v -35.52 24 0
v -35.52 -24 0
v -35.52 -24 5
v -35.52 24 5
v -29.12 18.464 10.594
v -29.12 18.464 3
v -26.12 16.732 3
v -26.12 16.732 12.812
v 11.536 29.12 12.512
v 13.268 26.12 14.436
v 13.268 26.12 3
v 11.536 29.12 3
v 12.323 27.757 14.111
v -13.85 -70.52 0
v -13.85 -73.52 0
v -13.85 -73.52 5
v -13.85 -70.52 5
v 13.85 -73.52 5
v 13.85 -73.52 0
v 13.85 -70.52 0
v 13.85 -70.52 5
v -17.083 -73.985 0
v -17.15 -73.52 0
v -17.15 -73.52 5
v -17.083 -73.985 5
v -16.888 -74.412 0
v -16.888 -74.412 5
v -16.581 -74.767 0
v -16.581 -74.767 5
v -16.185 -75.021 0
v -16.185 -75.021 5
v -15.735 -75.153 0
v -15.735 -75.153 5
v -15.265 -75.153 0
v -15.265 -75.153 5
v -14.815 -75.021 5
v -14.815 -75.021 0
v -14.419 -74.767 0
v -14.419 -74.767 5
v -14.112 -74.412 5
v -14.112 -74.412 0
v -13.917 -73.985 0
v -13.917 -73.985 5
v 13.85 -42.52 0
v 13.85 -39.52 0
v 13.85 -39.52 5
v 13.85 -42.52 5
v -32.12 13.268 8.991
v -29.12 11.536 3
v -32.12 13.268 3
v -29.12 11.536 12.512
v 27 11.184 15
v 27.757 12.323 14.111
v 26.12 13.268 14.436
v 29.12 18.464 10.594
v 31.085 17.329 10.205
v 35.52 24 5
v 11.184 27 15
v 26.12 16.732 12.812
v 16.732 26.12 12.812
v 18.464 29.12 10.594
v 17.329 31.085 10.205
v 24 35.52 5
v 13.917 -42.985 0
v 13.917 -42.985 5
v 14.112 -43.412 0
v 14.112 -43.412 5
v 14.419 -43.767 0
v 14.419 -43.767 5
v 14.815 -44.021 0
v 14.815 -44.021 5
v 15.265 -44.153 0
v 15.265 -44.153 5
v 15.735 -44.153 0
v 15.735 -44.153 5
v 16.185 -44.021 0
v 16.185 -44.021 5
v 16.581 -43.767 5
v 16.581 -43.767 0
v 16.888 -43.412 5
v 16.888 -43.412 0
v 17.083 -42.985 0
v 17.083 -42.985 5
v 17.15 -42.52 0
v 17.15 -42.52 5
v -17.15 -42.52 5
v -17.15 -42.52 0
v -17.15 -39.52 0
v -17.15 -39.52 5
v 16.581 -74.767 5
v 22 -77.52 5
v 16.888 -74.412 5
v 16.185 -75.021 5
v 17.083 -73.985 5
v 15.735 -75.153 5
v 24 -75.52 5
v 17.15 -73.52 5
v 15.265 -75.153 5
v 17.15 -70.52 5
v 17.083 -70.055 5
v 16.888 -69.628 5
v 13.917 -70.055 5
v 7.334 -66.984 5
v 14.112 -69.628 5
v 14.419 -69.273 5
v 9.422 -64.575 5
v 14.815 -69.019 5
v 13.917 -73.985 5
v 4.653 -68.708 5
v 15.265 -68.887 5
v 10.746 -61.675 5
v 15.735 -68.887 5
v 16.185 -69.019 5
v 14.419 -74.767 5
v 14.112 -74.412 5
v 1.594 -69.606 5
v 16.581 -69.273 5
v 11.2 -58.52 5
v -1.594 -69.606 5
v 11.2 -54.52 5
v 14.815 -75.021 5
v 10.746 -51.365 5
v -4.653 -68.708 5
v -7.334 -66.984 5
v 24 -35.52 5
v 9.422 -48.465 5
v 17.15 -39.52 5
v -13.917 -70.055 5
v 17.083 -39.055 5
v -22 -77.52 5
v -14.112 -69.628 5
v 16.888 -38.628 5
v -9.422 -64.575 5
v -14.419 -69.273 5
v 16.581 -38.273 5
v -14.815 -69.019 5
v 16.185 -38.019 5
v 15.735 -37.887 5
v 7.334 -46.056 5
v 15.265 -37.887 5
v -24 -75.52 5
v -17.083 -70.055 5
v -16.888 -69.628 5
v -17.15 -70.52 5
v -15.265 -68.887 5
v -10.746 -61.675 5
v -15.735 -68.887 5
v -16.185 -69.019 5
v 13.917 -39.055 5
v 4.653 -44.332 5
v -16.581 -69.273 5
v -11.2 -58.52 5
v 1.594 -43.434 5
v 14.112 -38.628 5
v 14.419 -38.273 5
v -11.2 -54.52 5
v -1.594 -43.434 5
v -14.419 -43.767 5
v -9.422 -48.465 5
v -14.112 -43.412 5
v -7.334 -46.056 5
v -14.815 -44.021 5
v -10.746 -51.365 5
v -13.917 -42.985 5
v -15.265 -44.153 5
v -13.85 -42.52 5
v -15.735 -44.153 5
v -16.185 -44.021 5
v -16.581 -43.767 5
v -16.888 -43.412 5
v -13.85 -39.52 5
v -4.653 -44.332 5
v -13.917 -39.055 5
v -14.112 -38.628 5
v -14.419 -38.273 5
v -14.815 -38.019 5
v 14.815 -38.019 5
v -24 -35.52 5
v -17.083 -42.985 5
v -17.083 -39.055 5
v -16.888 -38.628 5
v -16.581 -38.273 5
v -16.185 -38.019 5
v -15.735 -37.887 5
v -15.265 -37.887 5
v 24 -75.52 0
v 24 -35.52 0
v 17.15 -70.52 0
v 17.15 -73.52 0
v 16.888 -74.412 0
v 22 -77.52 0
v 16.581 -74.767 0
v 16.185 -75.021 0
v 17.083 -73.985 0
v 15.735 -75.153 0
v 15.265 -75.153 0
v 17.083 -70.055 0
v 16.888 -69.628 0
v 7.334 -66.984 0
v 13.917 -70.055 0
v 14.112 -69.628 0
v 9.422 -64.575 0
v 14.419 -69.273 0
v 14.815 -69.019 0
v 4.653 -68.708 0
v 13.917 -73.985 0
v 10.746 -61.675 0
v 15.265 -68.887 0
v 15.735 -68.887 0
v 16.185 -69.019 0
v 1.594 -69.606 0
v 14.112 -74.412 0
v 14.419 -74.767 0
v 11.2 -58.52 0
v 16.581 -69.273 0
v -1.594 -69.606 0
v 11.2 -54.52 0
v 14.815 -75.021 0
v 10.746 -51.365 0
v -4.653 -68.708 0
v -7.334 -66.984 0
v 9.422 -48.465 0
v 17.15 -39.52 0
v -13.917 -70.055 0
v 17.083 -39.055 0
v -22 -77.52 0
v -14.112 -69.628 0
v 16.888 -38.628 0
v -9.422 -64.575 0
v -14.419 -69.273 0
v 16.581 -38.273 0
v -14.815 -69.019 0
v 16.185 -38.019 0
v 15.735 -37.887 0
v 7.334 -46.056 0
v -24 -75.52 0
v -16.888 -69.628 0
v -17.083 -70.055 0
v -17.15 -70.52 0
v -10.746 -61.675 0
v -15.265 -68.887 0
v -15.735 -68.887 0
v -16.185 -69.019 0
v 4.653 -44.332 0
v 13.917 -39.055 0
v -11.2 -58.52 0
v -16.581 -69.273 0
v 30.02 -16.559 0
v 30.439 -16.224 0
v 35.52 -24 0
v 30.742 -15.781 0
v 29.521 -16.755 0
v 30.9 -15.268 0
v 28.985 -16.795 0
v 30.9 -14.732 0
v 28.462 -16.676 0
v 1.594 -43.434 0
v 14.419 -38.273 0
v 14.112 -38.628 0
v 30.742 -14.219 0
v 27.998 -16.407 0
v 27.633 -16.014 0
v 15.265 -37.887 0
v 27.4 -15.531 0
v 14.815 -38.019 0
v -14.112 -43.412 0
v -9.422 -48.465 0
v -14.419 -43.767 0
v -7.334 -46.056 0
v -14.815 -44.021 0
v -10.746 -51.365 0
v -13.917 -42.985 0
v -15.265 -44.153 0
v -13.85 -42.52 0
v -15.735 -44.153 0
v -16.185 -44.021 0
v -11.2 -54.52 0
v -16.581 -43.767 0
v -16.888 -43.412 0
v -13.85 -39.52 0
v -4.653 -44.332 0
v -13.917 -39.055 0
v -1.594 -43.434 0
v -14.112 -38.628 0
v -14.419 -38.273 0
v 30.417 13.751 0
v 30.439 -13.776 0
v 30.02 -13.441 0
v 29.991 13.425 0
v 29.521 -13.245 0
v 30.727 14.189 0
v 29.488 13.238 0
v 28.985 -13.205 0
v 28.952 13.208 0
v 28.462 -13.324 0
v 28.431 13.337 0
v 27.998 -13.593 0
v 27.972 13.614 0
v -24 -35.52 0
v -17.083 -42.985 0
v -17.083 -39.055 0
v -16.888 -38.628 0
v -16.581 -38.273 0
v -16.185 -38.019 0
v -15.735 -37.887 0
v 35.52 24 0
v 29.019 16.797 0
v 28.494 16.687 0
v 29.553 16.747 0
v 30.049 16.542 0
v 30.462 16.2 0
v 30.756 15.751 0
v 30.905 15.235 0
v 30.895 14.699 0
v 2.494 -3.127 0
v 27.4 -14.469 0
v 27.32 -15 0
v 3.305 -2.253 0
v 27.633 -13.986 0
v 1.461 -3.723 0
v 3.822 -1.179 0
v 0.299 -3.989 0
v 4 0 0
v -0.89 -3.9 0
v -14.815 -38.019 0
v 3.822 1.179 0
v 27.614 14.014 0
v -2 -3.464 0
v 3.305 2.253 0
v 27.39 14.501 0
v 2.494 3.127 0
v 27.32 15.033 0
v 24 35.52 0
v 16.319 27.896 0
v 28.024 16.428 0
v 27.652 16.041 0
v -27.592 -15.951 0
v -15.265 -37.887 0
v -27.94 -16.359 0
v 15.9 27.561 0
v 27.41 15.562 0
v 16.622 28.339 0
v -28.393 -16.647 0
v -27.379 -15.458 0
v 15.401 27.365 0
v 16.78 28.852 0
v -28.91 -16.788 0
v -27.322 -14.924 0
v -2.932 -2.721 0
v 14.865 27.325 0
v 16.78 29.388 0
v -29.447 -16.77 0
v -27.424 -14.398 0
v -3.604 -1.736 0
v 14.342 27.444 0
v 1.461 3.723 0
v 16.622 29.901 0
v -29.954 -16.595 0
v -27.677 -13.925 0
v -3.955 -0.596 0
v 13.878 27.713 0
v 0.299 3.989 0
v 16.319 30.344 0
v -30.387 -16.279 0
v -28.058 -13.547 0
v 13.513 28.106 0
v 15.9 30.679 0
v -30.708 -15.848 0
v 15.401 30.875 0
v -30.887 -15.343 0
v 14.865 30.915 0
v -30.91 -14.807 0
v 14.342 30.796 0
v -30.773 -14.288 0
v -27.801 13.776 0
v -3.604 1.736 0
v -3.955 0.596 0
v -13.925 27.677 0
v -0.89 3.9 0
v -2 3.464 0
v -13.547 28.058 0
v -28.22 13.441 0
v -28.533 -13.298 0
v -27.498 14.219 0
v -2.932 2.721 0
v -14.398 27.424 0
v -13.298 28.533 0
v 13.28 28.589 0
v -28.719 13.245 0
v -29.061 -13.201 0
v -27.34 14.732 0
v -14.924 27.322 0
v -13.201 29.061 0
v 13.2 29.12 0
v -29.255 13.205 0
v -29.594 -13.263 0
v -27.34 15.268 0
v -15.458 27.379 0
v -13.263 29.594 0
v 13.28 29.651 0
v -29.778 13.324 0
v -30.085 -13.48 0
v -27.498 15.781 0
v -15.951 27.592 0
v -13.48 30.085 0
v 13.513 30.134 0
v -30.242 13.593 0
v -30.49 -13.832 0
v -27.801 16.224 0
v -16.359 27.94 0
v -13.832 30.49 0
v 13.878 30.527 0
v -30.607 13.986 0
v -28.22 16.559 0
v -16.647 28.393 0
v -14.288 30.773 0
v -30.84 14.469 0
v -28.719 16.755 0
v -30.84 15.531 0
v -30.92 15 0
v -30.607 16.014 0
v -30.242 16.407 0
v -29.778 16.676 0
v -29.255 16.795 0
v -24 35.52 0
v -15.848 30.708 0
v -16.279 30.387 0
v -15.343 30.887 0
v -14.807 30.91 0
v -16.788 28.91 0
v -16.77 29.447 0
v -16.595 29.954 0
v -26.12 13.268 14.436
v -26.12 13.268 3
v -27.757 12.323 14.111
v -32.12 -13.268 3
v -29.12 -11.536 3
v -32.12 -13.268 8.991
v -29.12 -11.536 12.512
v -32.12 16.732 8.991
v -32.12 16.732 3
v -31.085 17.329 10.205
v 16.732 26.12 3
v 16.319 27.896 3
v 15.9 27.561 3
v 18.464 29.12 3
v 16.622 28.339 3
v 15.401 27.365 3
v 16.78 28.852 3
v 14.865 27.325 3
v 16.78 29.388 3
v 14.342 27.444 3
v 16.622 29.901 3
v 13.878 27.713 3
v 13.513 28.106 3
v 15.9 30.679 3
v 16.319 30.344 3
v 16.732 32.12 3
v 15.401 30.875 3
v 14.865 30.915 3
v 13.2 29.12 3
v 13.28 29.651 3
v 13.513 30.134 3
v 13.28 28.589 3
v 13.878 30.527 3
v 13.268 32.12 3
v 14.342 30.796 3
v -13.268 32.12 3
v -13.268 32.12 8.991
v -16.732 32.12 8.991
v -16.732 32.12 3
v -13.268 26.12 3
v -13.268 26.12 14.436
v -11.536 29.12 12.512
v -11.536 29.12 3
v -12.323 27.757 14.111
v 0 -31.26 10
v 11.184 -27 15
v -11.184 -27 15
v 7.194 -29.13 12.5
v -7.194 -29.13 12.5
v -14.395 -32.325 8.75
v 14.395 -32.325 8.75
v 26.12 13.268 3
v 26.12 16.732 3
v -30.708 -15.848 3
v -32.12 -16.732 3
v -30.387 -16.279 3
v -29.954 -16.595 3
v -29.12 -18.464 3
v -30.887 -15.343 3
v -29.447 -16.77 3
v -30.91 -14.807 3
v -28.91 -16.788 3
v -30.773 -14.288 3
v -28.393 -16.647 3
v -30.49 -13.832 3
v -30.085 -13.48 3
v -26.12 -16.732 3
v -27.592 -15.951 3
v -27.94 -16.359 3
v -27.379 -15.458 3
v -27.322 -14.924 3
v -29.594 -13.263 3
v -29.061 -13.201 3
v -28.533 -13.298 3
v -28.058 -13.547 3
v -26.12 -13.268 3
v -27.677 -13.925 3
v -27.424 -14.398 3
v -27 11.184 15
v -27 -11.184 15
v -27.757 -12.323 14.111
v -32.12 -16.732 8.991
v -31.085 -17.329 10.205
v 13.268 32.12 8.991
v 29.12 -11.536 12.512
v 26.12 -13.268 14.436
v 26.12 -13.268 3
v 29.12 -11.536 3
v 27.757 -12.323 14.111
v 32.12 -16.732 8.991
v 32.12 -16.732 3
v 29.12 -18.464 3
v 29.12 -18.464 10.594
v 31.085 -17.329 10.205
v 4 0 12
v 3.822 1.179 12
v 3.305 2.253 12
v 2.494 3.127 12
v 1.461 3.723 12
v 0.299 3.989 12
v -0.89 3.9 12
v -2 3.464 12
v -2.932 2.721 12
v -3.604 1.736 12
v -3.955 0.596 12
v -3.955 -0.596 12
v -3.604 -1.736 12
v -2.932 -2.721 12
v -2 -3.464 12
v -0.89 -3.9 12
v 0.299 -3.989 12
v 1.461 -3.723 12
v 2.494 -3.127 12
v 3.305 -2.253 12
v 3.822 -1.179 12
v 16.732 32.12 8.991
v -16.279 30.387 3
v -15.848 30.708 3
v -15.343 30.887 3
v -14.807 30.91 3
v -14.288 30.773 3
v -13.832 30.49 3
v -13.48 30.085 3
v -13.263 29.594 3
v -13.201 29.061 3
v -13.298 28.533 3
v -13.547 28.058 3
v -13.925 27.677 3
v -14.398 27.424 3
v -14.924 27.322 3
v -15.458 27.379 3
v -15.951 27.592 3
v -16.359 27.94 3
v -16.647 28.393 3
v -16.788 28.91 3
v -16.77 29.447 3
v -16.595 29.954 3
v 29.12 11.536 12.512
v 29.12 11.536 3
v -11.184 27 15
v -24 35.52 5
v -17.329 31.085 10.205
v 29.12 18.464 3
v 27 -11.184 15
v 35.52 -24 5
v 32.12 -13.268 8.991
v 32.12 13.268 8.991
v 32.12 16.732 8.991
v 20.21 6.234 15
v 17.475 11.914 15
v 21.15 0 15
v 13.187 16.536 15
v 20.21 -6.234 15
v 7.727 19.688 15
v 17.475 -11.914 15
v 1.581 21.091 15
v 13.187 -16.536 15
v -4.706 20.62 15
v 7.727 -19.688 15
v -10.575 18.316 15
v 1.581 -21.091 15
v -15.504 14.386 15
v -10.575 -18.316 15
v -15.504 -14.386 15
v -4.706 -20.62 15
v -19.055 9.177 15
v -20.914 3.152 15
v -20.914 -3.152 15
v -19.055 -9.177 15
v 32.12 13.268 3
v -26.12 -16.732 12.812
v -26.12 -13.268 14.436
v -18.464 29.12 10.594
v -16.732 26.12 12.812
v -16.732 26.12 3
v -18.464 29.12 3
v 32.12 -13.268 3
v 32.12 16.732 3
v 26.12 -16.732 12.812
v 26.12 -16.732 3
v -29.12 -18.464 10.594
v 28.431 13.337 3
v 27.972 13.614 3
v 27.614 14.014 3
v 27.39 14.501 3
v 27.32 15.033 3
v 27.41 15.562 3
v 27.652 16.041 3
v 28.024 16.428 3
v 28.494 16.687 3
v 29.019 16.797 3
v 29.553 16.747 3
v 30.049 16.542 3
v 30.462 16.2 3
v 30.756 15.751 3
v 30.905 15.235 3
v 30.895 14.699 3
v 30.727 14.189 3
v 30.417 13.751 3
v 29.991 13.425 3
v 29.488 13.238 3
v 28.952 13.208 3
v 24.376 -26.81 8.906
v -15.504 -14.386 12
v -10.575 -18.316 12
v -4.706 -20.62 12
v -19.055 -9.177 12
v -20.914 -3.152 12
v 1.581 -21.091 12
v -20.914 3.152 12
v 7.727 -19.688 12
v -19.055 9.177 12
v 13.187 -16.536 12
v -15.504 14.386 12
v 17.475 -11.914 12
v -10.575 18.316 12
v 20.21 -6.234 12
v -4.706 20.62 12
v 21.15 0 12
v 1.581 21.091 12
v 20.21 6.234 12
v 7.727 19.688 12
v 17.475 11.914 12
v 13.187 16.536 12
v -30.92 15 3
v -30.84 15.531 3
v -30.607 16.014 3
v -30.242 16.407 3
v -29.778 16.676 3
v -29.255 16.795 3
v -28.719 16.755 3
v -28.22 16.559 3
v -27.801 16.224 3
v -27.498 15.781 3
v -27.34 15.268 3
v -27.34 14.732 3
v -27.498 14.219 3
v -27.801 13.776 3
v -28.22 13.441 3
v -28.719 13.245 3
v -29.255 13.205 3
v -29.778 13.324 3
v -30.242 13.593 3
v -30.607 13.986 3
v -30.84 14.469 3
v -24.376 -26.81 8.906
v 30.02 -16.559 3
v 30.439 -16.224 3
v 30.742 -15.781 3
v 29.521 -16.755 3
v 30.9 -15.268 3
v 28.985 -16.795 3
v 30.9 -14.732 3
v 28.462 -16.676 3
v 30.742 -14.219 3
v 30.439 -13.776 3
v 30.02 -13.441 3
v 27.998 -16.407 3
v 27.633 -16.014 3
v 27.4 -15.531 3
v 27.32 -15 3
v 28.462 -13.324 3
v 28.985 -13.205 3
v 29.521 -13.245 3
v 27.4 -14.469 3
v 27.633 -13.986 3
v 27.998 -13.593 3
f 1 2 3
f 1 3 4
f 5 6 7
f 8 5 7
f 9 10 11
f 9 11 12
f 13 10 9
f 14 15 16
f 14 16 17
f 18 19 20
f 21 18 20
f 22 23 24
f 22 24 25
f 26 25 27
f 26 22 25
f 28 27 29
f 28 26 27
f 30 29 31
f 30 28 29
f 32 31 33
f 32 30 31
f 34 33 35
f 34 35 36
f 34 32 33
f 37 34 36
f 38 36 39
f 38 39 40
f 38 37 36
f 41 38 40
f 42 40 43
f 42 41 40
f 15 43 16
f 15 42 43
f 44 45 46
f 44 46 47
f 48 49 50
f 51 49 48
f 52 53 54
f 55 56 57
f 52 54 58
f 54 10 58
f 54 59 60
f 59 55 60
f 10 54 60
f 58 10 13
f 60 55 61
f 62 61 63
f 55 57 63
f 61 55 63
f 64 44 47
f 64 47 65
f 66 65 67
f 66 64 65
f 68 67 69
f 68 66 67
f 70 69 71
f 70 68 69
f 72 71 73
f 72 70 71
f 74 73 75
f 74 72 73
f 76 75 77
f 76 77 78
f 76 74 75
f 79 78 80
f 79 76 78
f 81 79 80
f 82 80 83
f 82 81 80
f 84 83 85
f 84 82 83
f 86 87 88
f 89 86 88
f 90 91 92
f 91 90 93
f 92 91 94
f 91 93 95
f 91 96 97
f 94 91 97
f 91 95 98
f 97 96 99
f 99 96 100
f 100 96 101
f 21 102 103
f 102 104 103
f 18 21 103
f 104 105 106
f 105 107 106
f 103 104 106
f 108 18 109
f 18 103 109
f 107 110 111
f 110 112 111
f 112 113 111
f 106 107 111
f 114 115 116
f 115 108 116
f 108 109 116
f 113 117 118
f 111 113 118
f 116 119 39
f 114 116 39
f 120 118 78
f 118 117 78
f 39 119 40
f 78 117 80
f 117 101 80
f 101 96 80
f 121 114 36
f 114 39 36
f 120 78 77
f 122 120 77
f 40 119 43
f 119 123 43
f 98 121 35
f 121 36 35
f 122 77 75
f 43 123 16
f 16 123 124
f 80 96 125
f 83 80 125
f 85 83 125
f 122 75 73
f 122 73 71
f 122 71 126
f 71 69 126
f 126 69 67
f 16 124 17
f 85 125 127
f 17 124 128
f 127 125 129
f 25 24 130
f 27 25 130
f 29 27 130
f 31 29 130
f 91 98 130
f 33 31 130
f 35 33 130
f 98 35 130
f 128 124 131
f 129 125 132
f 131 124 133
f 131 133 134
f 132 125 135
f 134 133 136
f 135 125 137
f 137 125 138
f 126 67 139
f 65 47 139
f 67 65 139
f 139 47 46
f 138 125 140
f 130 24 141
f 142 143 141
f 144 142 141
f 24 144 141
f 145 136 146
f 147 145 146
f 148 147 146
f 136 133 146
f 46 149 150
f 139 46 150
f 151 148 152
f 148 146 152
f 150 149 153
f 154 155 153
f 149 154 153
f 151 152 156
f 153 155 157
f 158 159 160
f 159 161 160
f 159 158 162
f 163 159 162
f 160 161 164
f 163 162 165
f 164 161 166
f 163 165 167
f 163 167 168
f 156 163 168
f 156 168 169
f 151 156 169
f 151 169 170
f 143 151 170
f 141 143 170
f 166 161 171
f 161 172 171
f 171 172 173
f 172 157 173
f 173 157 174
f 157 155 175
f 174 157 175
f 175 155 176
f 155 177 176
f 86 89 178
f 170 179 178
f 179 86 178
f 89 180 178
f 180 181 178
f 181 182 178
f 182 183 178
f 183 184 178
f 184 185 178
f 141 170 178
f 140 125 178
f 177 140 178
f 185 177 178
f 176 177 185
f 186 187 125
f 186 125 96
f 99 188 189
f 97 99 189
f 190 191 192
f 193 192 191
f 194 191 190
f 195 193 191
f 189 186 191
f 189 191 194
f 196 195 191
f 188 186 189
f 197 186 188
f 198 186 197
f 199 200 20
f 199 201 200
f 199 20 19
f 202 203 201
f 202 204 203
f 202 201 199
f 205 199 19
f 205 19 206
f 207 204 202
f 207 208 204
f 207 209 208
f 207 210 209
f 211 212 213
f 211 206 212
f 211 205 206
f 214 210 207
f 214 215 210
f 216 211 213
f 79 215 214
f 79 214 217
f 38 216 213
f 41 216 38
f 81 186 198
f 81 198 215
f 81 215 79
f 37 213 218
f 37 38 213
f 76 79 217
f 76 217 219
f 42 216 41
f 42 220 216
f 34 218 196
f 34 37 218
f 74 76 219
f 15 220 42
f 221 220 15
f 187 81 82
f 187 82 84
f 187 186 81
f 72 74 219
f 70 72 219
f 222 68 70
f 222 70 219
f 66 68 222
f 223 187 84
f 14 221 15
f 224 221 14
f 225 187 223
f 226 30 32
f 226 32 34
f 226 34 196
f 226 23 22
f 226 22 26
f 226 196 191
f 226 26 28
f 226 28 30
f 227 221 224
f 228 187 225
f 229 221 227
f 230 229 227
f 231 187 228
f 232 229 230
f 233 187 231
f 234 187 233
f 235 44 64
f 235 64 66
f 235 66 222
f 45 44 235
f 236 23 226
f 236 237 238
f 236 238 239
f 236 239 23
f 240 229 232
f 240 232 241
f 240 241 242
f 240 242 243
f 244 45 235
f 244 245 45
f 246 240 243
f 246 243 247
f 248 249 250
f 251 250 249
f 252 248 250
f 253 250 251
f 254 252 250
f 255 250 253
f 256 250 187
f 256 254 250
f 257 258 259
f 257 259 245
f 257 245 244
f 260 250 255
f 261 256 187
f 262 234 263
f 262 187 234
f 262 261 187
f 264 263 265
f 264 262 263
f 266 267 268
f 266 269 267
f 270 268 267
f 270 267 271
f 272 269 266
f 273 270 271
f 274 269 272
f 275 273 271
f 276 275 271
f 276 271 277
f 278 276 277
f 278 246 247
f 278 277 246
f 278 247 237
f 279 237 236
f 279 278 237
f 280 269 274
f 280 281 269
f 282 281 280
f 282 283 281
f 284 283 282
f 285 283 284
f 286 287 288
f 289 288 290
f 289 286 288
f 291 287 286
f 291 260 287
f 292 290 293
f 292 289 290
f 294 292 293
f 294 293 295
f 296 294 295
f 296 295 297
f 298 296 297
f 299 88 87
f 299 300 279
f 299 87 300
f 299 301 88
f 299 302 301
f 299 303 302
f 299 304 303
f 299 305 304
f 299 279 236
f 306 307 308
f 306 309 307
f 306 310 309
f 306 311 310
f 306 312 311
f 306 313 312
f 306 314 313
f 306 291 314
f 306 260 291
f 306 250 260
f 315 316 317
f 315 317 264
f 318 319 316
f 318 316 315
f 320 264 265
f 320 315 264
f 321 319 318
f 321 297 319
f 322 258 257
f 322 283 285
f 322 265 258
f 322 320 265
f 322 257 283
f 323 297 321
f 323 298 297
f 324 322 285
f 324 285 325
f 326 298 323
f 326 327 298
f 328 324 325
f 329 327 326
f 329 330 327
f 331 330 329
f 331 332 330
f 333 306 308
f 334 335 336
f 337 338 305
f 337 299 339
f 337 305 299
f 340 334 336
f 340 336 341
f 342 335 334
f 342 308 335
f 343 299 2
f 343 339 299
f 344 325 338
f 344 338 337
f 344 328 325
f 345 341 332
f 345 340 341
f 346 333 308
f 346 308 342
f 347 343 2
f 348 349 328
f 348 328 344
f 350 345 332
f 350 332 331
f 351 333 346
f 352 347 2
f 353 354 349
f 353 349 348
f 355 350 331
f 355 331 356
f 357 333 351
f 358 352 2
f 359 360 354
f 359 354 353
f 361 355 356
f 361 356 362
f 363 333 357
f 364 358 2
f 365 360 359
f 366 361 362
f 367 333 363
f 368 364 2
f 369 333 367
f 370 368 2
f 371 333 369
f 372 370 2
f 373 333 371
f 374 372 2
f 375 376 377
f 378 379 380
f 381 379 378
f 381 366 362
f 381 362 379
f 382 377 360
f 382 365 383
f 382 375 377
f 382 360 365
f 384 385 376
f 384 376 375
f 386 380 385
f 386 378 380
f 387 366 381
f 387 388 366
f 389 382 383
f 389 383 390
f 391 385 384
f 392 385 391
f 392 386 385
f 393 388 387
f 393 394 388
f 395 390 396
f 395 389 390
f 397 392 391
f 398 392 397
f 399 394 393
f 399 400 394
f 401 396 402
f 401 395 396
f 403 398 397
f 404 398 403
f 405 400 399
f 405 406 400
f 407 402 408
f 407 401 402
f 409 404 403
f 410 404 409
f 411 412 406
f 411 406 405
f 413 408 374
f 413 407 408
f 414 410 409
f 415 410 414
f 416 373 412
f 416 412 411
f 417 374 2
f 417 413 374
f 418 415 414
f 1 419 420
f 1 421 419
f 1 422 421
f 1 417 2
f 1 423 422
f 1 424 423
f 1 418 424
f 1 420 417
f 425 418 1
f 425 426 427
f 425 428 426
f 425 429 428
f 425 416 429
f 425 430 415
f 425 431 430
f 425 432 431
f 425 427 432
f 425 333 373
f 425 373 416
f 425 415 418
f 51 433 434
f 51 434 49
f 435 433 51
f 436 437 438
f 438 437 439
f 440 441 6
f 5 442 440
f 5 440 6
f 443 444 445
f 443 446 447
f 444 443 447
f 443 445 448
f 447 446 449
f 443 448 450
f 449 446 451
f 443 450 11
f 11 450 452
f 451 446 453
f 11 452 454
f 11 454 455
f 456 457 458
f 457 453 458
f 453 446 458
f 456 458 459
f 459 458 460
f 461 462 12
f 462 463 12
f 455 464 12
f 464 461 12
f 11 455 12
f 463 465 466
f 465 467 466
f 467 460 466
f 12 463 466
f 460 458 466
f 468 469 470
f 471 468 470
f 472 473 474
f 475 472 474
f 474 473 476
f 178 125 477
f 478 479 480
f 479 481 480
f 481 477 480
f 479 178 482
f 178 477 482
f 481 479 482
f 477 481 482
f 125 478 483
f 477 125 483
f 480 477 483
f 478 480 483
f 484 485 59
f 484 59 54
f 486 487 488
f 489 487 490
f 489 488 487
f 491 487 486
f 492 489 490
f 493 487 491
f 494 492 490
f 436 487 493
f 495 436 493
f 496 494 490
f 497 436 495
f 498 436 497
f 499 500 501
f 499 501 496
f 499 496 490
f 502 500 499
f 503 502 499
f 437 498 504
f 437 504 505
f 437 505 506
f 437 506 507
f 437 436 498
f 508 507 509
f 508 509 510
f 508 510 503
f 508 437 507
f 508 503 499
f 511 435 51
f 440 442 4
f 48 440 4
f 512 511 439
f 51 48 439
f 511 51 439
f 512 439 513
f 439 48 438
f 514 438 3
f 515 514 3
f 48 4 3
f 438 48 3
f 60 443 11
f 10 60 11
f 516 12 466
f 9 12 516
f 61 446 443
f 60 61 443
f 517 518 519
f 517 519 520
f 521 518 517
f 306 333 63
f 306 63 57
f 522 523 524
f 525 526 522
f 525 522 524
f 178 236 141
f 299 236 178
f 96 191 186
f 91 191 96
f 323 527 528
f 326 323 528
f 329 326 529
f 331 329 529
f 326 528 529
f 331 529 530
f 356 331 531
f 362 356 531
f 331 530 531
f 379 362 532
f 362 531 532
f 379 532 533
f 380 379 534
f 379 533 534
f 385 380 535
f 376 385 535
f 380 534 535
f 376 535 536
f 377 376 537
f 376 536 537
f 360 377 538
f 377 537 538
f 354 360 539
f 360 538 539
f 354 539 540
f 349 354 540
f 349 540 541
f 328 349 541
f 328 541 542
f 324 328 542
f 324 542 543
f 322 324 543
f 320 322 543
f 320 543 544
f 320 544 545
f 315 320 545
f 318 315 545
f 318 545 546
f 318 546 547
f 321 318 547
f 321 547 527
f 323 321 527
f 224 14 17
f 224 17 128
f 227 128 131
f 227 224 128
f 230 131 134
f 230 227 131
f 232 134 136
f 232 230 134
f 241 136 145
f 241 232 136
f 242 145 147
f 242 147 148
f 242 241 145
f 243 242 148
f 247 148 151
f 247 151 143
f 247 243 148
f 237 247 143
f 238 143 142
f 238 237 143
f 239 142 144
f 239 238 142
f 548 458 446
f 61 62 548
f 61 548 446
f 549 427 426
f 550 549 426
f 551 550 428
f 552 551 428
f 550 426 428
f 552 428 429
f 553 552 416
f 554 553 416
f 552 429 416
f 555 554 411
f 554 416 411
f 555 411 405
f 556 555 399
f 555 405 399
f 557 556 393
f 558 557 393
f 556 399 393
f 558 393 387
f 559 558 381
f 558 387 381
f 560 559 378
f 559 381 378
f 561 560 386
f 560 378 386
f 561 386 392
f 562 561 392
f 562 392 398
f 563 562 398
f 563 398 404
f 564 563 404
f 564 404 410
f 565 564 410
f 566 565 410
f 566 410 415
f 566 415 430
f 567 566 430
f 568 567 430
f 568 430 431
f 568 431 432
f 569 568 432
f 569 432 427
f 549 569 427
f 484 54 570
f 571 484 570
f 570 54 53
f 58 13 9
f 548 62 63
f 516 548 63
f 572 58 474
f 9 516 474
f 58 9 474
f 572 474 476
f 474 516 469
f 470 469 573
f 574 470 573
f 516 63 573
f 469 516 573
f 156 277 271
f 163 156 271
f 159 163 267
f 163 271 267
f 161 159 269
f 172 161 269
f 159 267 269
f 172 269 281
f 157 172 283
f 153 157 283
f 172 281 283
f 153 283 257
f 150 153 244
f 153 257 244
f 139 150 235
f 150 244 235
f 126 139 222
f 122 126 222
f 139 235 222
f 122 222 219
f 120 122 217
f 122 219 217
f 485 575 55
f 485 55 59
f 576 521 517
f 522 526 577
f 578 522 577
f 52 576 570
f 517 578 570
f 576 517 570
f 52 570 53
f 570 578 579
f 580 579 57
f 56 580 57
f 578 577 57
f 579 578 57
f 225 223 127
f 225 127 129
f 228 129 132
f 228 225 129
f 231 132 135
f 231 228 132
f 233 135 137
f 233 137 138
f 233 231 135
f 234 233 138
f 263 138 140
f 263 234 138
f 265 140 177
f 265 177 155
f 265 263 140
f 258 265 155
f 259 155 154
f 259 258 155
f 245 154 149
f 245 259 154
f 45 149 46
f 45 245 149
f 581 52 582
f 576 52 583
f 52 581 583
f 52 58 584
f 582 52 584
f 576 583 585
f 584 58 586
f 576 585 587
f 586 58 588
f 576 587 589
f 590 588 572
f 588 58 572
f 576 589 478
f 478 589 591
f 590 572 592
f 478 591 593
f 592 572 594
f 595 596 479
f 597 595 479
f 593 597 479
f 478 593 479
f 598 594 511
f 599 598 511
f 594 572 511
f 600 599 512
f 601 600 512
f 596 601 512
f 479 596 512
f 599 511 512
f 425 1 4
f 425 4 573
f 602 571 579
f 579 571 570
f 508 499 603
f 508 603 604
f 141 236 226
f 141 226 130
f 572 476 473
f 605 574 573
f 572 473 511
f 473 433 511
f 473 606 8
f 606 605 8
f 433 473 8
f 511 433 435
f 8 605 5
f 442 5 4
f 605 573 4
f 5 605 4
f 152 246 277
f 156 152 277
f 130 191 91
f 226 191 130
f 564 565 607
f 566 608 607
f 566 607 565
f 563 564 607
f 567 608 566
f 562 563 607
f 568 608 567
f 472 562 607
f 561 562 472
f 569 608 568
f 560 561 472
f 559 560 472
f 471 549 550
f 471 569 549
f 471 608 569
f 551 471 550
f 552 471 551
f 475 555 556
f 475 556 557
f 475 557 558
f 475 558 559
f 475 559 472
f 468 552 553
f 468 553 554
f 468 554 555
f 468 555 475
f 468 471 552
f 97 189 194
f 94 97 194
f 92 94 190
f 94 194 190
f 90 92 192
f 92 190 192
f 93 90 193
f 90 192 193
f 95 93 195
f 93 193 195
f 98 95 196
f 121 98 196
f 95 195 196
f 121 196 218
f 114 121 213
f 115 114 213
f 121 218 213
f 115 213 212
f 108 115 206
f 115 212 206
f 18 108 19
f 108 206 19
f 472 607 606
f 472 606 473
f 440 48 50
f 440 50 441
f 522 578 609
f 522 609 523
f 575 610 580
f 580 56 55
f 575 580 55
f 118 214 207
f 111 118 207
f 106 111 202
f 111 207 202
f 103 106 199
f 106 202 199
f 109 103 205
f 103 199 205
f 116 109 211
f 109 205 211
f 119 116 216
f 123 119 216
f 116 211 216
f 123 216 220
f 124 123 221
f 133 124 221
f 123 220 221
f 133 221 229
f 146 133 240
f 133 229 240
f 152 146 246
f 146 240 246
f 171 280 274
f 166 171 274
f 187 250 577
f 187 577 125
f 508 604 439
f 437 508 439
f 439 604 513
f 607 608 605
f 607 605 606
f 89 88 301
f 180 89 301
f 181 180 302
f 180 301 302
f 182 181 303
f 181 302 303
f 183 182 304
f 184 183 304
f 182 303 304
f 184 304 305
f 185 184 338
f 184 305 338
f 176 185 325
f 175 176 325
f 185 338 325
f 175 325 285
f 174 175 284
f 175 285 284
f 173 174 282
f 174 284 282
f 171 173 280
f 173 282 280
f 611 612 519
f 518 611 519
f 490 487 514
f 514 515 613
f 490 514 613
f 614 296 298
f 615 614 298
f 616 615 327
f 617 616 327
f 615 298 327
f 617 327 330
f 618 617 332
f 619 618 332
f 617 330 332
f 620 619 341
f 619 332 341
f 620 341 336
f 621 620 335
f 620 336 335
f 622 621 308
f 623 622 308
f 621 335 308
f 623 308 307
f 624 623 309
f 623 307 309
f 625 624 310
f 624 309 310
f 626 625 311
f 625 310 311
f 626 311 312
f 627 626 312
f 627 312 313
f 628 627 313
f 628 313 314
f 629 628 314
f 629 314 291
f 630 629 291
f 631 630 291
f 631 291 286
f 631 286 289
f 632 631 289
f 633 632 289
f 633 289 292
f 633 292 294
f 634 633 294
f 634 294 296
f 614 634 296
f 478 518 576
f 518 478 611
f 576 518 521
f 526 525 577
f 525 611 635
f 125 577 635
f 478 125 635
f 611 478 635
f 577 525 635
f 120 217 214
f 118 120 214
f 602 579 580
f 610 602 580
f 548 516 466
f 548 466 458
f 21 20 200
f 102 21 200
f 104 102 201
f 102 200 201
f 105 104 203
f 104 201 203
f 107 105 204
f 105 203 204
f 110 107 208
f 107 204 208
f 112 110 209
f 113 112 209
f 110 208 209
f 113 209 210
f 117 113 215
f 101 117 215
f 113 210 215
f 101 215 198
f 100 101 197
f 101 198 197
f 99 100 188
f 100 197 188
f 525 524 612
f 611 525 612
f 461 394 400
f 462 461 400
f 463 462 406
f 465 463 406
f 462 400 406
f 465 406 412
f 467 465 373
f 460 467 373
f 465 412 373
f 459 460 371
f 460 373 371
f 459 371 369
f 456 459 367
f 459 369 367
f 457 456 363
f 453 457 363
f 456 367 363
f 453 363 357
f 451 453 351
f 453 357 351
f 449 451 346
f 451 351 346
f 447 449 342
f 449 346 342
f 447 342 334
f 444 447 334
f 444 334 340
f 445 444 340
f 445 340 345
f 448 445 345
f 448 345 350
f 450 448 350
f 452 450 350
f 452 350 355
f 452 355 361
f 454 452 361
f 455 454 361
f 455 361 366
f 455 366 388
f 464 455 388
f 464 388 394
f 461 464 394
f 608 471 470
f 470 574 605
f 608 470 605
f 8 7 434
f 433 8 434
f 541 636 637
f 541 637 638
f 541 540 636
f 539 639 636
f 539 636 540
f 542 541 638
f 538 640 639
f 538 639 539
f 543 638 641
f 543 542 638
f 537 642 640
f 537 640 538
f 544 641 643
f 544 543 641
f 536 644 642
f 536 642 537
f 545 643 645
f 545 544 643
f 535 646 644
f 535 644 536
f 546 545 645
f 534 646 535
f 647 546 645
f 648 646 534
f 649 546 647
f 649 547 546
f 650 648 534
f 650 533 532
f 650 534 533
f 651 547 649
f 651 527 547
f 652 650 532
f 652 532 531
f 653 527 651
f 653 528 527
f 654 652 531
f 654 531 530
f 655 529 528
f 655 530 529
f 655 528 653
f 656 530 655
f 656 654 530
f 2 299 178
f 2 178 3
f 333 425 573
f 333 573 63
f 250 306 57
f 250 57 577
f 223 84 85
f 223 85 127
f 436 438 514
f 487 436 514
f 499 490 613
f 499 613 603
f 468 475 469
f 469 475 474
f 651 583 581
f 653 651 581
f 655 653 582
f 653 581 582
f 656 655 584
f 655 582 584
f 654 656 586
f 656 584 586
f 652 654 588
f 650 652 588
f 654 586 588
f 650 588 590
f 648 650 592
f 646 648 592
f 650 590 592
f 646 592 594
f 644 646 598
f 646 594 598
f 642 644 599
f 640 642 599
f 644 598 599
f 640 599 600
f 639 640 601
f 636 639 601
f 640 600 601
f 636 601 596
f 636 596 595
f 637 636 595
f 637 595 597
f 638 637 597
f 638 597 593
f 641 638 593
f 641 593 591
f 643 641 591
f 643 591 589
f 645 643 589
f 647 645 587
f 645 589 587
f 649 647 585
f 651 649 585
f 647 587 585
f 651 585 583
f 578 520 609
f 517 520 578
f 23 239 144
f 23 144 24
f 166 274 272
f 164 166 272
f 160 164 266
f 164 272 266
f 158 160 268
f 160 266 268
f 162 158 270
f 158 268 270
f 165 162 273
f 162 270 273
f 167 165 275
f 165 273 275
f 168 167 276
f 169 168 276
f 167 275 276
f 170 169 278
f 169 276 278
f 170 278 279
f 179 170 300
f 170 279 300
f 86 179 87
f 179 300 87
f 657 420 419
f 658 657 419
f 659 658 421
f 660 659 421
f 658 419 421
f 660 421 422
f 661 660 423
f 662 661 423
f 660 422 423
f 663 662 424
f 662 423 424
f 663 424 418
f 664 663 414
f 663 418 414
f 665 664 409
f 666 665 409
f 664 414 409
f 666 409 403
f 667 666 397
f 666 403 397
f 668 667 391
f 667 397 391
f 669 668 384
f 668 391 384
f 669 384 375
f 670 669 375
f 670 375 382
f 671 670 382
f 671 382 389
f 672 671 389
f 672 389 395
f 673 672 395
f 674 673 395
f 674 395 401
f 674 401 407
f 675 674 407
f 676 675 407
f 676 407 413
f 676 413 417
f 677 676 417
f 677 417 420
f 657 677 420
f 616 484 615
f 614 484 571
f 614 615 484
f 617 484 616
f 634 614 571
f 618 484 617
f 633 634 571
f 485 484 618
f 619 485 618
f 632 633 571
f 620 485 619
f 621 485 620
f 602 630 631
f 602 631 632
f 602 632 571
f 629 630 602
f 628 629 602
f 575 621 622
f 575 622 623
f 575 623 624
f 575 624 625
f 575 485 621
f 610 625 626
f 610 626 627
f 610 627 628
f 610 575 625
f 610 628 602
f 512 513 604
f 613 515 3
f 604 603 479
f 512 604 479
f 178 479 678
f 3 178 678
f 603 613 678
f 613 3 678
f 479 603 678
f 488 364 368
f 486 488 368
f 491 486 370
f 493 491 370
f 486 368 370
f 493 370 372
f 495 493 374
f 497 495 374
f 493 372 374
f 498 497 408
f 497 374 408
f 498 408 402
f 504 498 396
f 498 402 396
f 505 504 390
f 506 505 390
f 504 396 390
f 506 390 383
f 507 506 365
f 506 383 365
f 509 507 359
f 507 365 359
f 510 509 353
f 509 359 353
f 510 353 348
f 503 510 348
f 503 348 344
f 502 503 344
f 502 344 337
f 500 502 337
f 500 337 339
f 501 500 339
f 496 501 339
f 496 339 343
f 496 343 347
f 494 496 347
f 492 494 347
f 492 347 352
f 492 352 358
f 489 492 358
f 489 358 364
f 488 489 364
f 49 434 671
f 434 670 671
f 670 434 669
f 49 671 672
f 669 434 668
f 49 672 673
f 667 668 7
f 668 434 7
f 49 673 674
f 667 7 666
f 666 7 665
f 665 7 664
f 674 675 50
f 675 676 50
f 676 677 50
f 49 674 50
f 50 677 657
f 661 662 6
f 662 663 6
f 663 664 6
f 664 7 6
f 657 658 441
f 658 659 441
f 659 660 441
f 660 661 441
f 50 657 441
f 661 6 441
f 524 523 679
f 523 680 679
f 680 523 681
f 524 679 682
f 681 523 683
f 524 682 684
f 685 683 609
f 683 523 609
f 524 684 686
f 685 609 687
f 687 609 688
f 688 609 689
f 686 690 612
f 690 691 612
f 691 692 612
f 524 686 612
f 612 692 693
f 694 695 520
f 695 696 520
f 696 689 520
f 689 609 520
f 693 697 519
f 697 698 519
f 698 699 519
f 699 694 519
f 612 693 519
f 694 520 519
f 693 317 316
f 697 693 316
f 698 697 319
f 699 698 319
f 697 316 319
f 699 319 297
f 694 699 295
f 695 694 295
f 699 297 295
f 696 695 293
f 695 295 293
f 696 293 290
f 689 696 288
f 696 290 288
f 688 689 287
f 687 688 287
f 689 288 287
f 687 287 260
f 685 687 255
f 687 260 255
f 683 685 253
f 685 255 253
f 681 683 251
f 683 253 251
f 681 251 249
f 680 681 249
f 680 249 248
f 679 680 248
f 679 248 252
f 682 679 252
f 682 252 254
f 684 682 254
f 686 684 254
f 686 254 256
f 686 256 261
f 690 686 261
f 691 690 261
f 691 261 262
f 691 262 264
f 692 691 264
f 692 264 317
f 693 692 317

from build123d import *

# Parameters (mm, degrees)
EXTRUDE_1_DEPTH     = 5
SKETCH_5_R          = 21.15
CUT_EXTRUDE_1_DEPTH = 3
SKETCH_6_R          = 4
CUT_EXTRUDE_2_DEPTH = 37
SKETCH_7_R          = 1.8
CUT_EXTRUDE_3_DEPTH = 37
CUT_EXTRUDE_4_DEPTH = 12
CHAMFER_1_SIZE      = 2


with BuildPart() as part:
    # 草图1 → 凸台-拉伸1 (new body)
    with BuildSketch(Plane.XY):
        Polygon((24, 35.52), (35.52, 24), (35.52, -24), (24, -35.52), (24, -77.52), (-24, -77.52), (-24, -35.52), (-35.52, -24), (-35.52, 24), (-24, 35.52), align=None)
        with BuildLine():
            Line((11.2, -54.52), (11.2, -58.52))
            ThreePointArc((11.2, -58.52), (0, -69.72), (-11.2, -58.52))
            Line((-11.2, -58.52), (-11.2, -54.52))
            ThreePointArc((-11.2, -54.52), (0, -43.32), (11.2, -54.52))
        make_face(mode=Mode.SUBTRACT)
        with BuildLine():
            Line((-17.15, -42.52), (-17.15, -39.52))
            ThreePointArc((-17.15, -39.52), (-15.5, -37.87), (-13.85, -39.52))
            Line((-13.85, -39.52), (-13.85, -42.52))
            ThreePointArc((-13.85, -42.52), (-15.5, -44.17), (-17.15, -42.52))
        make_face(mode=Mode.SUBTRACT)
        with BuildLine():
            Line((17.15, -42.52), (17.15, -39.52))
            ThreePointArc((17.15, -39.52), (15.5, -37.87), (13.85, -39.52))
            Line((13.85, -39.52), (13.85, -42.52))
            ThreePointArc((13.85, -42.52), (15.5, -44.17), (17.15, -42.52))
        make_face(mode=Mode.SUBTRACT)
        with BuildLine():
            Line((17.15, -70.52), (17.15, -73.52))
            ThreePointArc((17.15, -73.52), (15.5, -75.17), (13.85, -73.52))
            Line((13.85, -73.52), (13.85, -70.52))
            ThreePointArc((13.85, -70.52), (15.5, -68.87), (17.15, -70.52))
        make_face(mode=Mode.SUBTRACT)
        with BuildLine():
            Line((-17.15, -70.52), (-17.15, -73.52))
            ThreePointArc((-17.15, -73.52), (-15.5, -75.17), (-13.85, -73.52))
            Line((-13.85, -73.52), (-13.85, -70.52))
            ThreePointArc((-13.85, -70.52), (-15.5, -68.87), (-17.15, -70.52))
        make_face(mode=Mode.SUBTRACT)
    extrude(amount=EXTRUDE_1_DEPTH)

    # 草图3 → 放样1 section 0
    with BuildSketch(Plane.XY.offset(15)):
        with BuildLine():
            Line((11.183766184, 27), (-11.183766184, 27))
            Line((-11.183766184, 27), (-27, 11.183766184))
            Line((-27, 11.183766184), (-27, -11.183766184))
            Line((-27, -11.183766184), (-11.183766184, -27))
            Line((-11.183766184, -27), (11.183766184, -27))
            Line((11.183766184, -27), (27, -11.183766184))
            Line((27, -11.183766184), (27, 11.183766184))
            Line((27, 11.183766184), (11.183766184, 27))
        make_face()
    # 草图4 → 放样1 section 1
    with BuildSketch(Plane.XY.offset(5)):
        with BuildLine():
            Line((-24, -35.52), (24, -35.52))
            Line((24, -35.52), (35.52, -24))
            Line((35.52, -24), (35.52, 24))
            Line((35.52, 24), (24, 35.52))
            Line((24, 35.52), (-24, 35.52))
            Line((-24, 35.52), (-35.52, 24))
            Line((-35.52, 24), (-35.52, -24))
            Line((-35.52, -24), (-24, -35.52))
        make_face()
    loft()

    # 草图5 → 切除-拉伸1 (cut)
    with BuildSketch(Plane.XY.offset(15)):
        Circle(SKETCH_5_R)
    extrude(amount=-CUT_EXTRUDE_1_DEPTH, mode=Mode.SUBTRACT)

    # 草图6 → 切除-拉伸2 (cut)
    with BuildSketch(Plane.XY.offset(12)):
        Circle(SKETCH_6_R)
    extrude(amount=-CUT_EXTRUDE_2_DEPTH, mode=Mode.SUBTRACT)

    # 草图7 → 切除-拉伸3 (cut)
    with BuildSketch(Plane(origin=(0, 0, 0), x_dir=(-1, 0, 0), z_dir=(0, 0, -1))):
        with Locations((29.12, 15)):
            Circle(SKETCH_7_R)
        with Locations(Location((29.12, -15, 0), (0, 0, 314.737833249))):
            Circle(SKETCH_7_R)
        with Locations((-29.12, -15)):
            Circle(SKETCH_7_R)
        with Locations(Location((-29.12, 15, 0), (0, 0, 292.492646576))):
            Circle(SKETCH_7_R)
        with Locations((-15, 29.12)):
            Circle(SKETCH_7_R)
        with Locations(Location((15, 29.12, 0), (0, 0, 44.737833249))):
            Circle(SKETCH_7_R)
    extrude(amount=-CUT_EXTRUDE_3_DEPTH, mode=Mode.SUBTRACT)

    # 草图8 → 切除-拉伸4 (cut)
    with BuildSketch(Plane.XY.offset(15)):
        Polygon((-29.12, -11.535898385), (-32.12, -13.267949192), (-32.12, -16.732050808), (-29.12, -18.464101615), (-26.12, -16.732050808), (-26.12, -13.267949192), align=None)
        Polygon((-26.12, 13.267949192), (-29.12, 11.535898385), (-32.12, 13.267949192), (-32.12, 16.732050808), (-29.12, 18.464101615), (-26.12, 16.732050808), align=None)
        Polygon((13.267949192, 26.12), (11.535898385, 29.12), (13.267949192, 32.12), (16.732050808, 32.12), (18.464101615, 29.12), (16.732050808, 26.12), align=None)
        Polygon((-11.535898385, 29.12), (-13.267949192, 32.12), (-16.732050808, 32.12), (-18.464101615, 29.12), (-16.732050808, 26.12), (-13.267949192, 26.12), align=None)
        Polygon((26.12, -13.267949192), (29.12, -11.535898385), (32.12, -13.267949192), (32.12, -16.732050808), (29.12, -18.464101615), (26.12, -16.732050808), align=None)
        Polygon((29.12, 11.535898385), (32.12, 13.267949192), (32.12, 16.732050808), (29.12, 18.464101615), (26.12, 16.732050808), (26.12, 13.267949192), align=None)
    extrude(amount=-CUT_EXTRUDE_4_DEPTH, mode=Mode.SUBTRACT)

    # 倒角1
    chamfer_1_edges = [part.edges().sort_by_distance(p)[0] for p in [
        (24, -77.52, 2.5),
        (-24, -77.52, 2.5),
    ]]
    chamfer(chamfer_1_edges, length=CHAMFER_1_SIZE)


solid = part.part
